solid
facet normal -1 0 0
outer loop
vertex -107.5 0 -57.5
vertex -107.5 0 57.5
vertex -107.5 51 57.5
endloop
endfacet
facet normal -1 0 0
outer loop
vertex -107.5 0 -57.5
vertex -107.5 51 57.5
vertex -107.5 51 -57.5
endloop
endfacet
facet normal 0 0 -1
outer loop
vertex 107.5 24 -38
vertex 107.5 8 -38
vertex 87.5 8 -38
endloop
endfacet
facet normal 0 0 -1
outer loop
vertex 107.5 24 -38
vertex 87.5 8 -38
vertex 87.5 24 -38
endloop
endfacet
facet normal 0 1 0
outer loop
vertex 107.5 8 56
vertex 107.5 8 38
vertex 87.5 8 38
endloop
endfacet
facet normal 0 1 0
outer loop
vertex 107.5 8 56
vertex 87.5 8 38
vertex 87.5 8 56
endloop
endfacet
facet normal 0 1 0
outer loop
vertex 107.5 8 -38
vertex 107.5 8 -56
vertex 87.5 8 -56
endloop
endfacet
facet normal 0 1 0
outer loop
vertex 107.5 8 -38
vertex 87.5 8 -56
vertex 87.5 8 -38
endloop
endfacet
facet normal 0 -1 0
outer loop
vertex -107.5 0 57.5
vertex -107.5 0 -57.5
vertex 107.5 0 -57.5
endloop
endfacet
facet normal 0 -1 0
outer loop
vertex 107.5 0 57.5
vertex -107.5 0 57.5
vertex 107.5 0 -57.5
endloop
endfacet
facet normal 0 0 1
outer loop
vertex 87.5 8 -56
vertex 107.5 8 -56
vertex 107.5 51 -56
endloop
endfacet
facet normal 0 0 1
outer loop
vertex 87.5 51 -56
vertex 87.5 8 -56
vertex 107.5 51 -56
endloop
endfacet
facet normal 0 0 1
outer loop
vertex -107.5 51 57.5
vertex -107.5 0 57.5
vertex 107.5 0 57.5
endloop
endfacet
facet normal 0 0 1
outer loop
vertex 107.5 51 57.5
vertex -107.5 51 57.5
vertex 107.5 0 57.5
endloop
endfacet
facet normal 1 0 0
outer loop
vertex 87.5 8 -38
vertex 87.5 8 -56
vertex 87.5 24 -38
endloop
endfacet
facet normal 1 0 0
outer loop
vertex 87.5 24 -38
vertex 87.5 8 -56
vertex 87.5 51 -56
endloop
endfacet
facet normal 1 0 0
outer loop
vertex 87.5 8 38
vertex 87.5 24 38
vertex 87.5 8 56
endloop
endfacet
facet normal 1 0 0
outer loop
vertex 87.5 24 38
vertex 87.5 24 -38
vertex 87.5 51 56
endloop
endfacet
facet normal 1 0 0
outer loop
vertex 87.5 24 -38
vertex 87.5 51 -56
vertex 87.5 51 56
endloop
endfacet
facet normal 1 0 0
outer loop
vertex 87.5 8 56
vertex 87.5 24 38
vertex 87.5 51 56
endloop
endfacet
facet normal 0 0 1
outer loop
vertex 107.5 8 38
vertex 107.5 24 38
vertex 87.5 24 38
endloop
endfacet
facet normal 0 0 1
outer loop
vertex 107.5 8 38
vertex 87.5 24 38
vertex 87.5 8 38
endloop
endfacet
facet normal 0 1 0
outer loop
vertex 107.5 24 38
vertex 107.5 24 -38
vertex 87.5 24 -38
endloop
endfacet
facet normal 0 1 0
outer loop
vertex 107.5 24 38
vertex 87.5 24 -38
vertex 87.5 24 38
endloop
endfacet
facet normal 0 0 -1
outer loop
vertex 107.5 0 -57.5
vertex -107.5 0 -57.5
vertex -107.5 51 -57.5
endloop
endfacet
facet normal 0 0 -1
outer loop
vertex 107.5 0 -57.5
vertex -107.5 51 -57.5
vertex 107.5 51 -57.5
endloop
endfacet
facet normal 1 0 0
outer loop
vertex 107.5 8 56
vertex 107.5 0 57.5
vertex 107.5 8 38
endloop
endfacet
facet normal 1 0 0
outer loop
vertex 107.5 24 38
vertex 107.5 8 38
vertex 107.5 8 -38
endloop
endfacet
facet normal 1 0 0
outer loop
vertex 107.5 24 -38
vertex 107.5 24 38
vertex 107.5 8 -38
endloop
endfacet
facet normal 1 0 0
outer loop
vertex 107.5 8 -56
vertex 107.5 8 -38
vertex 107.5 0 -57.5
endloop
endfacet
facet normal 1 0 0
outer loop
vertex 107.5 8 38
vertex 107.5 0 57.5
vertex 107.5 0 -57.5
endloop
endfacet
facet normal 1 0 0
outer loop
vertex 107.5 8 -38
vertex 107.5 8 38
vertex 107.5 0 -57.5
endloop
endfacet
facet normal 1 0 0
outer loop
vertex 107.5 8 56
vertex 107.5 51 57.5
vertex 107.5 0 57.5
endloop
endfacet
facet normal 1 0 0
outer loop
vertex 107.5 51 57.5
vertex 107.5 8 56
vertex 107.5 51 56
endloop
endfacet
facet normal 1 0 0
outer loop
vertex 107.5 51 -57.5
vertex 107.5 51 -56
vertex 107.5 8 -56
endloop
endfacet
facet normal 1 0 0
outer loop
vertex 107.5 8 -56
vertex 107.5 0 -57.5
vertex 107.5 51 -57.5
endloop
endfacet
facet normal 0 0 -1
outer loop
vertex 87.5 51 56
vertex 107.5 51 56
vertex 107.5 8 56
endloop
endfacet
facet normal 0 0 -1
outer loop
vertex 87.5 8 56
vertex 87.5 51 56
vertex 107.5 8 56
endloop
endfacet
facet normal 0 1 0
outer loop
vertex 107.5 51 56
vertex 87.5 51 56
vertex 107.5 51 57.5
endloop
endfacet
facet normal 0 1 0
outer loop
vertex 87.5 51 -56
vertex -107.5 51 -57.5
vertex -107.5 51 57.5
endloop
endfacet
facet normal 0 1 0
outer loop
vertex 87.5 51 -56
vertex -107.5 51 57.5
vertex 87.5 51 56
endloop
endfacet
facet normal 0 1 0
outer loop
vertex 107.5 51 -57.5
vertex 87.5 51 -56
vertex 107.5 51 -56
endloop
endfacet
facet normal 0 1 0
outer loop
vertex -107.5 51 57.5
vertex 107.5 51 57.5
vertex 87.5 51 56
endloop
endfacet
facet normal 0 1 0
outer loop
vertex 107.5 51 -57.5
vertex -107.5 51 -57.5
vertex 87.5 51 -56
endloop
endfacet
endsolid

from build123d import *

# Parameters (mm, degrees)
SKETCH_1_W          = 215
SKETCH_1_H          = 115
EXTRUDE_1_DEPTH     = 51
CUT_EXTRUDE_1_DEPTH = 20


with BuildPart() as part:
    # Эскиз1 → Бобышка-Вытянуть1 (new body)
    with BuildSketch(Plane(origin=(0, 0, 0), x_dir=(1, 0, 0), z_dir=(0, 1, 0))):
        Rectangle(SKETCH_1_W, SKETCH_1_H)
    extrude(amount=EXTRUDE_1_DEPTH)

    # Эскиз3 → Вырез-Вытянуть1 (cut)
    with BuildSketch(Plane(origin=(107.5, 0, 0), x_dir=(0, 0, -1), z_dir=(1, 0, 0))):
        Polygon((-56, 51), (56, 51), (56, 24), (56, 8), (38, 8), (38, 24), (-38, 24), (-38, 8), (-56, 8), (-56, 24), align=None)
    extrude(amount=-CUT_EXTRUDE_1_DEPTH, mode=Mode.SUBTRACT)


solid = part.part
